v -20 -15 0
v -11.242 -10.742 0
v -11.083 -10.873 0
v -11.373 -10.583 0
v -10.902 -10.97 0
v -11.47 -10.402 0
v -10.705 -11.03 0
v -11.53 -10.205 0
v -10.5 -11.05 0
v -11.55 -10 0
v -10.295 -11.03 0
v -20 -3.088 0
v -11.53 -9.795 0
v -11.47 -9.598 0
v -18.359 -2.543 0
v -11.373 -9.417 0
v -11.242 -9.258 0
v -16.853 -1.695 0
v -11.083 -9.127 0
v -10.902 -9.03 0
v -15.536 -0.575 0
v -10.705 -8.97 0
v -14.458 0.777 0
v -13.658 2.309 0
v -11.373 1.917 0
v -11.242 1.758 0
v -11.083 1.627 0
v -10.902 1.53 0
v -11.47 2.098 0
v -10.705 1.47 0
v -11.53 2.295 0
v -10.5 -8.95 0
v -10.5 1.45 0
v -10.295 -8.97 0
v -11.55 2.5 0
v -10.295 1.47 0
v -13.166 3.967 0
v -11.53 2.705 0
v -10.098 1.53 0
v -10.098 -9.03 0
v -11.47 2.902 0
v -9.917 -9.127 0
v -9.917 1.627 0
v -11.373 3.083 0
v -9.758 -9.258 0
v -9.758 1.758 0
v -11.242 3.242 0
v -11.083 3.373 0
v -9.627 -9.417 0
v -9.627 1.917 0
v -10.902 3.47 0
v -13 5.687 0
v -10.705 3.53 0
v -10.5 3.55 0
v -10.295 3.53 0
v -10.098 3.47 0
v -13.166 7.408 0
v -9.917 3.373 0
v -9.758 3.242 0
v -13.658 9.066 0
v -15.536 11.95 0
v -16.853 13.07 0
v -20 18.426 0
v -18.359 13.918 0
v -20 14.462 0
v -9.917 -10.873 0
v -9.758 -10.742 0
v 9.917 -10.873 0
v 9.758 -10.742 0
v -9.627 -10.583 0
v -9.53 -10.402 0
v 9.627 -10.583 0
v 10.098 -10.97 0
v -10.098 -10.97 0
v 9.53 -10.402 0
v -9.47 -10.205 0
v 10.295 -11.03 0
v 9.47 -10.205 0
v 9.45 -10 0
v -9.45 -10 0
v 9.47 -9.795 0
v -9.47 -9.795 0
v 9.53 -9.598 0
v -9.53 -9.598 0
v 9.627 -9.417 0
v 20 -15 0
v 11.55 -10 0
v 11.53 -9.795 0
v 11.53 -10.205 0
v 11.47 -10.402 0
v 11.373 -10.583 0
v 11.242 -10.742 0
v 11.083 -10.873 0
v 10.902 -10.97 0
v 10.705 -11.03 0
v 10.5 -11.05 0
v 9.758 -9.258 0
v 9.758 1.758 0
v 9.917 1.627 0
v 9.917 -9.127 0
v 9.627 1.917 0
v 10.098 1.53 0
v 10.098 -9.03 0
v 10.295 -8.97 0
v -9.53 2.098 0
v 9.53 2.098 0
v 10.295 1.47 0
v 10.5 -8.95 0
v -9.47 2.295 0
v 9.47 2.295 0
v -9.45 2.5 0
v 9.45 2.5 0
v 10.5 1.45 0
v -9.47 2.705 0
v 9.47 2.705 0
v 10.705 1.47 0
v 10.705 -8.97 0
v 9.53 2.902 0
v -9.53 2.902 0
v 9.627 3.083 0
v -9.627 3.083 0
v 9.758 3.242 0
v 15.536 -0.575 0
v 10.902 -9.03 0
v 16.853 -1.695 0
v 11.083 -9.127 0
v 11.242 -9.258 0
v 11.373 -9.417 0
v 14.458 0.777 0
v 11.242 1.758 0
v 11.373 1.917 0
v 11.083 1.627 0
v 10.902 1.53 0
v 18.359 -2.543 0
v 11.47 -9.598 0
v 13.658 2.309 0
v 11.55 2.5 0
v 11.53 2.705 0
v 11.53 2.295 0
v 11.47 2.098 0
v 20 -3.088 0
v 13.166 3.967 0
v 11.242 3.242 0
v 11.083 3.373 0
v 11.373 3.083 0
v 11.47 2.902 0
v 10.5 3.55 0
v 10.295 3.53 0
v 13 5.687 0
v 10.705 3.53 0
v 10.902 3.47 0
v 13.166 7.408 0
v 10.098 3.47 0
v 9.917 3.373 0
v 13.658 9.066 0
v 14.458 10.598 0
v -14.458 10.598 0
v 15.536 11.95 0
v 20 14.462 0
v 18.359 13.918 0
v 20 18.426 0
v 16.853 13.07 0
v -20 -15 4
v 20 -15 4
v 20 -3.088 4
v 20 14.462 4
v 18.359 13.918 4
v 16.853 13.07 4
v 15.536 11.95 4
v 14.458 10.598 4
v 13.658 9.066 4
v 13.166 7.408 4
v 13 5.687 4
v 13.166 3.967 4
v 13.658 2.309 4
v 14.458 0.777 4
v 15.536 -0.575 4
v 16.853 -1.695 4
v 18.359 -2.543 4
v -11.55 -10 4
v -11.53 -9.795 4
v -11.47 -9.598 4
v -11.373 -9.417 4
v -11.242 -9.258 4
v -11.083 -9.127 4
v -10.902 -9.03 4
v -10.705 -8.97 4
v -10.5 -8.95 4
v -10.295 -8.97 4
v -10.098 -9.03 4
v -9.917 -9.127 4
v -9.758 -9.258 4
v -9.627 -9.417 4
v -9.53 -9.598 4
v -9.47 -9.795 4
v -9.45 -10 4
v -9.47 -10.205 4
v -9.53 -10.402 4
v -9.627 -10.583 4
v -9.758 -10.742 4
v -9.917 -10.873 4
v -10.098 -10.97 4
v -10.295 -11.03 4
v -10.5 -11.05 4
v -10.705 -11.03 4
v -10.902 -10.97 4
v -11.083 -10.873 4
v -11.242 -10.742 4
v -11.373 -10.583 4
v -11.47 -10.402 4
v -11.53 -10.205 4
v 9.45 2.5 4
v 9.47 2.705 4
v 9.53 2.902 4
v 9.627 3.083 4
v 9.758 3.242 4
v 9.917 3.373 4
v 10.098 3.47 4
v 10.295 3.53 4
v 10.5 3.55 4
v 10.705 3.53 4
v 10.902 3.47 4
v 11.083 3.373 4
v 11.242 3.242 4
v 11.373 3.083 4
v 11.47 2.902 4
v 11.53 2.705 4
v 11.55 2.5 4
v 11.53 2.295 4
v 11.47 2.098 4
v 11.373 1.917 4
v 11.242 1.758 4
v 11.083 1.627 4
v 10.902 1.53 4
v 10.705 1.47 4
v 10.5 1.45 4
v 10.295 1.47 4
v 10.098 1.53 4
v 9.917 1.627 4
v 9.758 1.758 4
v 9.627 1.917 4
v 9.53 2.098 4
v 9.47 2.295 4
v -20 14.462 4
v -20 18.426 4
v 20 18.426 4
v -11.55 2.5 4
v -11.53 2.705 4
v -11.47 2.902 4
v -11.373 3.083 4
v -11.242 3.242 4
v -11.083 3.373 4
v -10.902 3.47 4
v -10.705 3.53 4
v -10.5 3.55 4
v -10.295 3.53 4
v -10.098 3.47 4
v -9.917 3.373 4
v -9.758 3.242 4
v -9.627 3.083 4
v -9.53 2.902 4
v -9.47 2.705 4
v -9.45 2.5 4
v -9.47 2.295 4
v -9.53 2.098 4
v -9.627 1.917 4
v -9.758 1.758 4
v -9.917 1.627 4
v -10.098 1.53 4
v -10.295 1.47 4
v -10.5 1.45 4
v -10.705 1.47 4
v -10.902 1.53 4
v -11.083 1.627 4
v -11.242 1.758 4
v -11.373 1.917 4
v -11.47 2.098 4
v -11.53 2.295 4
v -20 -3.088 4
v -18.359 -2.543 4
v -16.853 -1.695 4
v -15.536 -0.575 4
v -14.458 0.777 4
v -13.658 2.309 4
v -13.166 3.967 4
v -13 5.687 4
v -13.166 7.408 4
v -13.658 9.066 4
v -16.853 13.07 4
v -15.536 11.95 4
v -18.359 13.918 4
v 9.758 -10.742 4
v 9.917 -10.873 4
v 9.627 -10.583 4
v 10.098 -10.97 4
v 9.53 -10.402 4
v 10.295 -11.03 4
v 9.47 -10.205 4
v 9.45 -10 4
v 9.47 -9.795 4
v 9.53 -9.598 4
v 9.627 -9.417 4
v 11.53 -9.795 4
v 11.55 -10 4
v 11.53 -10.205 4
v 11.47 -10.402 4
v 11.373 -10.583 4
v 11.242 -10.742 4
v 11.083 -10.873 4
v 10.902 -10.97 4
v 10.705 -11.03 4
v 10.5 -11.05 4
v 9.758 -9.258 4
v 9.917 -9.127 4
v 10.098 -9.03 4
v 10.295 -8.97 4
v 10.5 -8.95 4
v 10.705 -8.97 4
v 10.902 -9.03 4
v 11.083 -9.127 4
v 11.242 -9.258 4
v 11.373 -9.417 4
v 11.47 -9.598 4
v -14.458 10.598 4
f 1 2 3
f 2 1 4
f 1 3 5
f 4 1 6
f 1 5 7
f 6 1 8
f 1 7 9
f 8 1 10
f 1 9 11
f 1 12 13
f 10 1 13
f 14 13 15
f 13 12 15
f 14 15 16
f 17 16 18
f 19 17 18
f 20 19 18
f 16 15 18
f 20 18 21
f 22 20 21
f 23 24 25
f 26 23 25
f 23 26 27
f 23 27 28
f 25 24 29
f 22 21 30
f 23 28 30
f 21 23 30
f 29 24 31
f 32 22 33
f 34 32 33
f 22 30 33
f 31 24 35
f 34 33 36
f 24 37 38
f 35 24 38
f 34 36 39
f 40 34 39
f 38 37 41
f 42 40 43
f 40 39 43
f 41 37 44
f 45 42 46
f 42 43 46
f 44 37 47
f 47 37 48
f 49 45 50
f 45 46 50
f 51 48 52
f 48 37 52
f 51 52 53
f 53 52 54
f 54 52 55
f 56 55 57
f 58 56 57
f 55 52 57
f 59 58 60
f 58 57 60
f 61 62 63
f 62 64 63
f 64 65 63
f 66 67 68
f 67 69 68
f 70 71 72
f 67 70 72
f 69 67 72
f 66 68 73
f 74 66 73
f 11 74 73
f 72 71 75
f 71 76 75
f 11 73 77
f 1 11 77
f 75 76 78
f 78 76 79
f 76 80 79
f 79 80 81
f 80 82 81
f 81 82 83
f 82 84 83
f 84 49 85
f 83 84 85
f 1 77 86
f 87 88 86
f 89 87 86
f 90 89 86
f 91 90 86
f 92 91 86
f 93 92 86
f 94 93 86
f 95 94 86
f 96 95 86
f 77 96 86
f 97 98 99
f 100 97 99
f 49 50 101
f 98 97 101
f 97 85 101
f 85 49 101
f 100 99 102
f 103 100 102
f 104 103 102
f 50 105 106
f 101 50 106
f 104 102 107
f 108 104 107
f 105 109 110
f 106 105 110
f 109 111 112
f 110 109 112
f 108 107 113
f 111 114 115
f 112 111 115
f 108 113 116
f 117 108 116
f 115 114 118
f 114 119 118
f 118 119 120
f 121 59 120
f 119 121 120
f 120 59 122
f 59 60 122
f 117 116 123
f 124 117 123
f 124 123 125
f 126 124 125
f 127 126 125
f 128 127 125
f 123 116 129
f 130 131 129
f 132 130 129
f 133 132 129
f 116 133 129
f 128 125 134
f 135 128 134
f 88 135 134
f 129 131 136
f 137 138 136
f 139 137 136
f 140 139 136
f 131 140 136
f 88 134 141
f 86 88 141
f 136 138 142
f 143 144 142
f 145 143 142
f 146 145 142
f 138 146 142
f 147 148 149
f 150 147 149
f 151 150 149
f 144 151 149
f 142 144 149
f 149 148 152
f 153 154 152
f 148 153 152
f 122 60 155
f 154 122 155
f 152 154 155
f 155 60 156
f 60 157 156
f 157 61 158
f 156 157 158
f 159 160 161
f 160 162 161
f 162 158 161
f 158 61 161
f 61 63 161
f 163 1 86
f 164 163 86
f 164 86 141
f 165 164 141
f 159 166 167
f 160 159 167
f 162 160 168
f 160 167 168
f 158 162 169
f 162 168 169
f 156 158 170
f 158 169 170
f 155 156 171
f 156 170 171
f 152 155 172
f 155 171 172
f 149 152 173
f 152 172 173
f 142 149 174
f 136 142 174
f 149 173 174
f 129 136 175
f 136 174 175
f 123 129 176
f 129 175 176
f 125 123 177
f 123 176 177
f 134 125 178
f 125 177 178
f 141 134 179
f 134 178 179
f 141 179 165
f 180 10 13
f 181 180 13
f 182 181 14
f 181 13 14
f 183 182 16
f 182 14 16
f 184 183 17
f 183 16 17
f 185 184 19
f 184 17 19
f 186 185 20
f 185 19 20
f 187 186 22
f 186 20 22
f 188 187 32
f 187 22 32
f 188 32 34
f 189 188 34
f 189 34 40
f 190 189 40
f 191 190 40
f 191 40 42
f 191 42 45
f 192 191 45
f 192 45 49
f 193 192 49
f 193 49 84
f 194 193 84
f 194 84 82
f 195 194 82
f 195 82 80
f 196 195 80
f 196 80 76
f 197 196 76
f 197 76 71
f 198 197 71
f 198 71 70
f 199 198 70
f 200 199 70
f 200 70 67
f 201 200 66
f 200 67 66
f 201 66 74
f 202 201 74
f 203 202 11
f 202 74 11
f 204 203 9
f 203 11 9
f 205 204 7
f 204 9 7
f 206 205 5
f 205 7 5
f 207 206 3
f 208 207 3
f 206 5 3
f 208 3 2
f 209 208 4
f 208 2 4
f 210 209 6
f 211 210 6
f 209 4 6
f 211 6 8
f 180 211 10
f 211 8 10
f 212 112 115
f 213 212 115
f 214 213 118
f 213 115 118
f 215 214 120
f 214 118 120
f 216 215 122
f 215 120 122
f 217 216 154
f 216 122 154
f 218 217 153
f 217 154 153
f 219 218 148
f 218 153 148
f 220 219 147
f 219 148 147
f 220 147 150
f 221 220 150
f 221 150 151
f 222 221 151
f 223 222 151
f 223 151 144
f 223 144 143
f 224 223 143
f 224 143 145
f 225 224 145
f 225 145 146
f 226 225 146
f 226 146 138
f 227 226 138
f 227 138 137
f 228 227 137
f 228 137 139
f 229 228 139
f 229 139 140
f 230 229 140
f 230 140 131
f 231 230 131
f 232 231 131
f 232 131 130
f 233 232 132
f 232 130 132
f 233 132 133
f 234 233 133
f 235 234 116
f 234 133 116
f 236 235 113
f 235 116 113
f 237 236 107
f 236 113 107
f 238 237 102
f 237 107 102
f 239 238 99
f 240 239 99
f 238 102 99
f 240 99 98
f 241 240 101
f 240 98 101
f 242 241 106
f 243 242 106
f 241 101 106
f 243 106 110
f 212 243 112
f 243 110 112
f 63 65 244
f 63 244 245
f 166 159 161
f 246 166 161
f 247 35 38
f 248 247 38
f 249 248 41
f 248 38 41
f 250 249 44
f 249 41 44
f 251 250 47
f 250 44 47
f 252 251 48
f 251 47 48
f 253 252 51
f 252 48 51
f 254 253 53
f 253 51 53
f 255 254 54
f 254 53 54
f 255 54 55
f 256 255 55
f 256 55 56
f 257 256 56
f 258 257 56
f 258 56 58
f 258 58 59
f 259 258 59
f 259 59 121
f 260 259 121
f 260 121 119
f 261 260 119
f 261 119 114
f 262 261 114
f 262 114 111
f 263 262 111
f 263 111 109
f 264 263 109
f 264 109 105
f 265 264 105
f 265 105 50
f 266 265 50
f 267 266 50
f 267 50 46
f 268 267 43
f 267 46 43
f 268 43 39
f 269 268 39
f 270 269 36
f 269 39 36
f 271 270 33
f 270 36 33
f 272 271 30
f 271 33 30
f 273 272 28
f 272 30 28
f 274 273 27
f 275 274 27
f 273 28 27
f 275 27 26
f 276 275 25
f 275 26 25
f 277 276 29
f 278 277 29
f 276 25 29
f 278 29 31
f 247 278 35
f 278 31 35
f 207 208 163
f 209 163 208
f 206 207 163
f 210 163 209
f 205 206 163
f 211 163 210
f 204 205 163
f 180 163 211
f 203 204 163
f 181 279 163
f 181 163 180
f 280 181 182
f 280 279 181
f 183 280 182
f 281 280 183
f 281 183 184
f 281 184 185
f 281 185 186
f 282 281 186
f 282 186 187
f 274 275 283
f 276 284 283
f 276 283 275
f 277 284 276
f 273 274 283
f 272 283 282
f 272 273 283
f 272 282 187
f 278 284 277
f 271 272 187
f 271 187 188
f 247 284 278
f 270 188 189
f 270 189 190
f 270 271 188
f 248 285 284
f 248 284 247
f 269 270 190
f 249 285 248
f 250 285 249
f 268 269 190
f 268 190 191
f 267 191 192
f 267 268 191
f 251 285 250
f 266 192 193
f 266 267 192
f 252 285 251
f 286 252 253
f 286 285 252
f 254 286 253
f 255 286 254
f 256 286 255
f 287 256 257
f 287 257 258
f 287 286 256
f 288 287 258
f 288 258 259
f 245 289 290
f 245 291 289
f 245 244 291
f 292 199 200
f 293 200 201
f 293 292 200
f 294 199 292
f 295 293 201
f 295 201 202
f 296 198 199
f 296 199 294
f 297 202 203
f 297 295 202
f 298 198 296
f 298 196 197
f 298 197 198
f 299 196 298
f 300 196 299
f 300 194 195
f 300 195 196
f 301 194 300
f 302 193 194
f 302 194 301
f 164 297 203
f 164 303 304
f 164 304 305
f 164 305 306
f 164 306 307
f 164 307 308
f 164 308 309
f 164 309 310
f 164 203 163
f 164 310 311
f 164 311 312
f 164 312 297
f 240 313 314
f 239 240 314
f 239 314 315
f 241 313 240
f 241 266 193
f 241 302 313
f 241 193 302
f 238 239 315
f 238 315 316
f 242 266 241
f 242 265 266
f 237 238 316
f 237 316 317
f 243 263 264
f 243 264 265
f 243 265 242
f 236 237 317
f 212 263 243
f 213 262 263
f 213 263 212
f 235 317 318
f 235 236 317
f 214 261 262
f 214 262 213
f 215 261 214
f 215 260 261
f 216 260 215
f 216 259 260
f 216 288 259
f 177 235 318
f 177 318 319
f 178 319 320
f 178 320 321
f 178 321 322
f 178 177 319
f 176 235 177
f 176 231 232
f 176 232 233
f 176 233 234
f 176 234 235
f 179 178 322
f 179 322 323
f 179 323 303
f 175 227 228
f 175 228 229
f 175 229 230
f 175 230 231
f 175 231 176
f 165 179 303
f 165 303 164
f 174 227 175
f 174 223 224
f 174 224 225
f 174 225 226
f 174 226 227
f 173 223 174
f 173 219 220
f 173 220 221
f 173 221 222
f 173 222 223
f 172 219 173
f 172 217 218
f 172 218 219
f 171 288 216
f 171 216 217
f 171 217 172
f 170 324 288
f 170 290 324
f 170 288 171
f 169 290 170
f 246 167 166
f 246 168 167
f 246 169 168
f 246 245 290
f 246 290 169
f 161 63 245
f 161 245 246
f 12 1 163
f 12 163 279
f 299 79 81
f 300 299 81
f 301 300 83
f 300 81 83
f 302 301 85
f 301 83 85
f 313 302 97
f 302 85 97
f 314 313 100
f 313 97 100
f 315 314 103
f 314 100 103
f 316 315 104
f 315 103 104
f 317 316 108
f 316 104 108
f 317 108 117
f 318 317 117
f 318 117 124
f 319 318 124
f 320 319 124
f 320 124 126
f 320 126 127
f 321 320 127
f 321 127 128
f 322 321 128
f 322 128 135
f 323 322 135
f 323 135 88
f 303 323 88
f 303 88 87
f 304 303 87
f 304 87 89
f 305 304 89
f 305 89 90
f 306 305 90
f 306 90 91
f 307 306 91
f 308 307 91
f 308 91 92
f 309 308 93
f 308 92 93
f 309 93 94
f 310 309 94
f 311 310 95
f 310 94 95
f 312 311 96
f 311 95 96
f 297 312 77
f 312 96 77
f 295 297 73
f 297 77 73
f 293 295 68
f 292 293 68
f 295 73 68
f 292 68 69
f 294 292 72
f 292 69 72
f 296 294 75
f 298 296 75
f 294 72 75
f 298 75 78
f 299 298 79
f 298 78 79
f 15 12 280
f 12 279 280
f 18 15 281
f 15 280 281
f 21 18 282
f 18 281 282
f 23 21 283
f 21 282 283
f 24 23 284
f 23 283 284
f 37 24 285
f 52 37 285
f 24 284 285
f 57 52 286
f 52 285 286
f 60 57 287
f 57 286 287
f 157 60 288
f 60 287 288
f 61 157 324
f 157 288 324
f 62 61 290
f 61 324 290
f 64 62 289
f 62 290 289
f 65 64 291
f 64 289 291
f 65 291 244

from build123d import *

# Parameters (mm, degrees)
SKETCH1_W           = 40
SKETCH1_H           = 33.426210179
BOSS_EXTRUDE1_DEPTH = 4
SKETCH2_R           = 1.05
CUT_EXTRUDE1_DEPTH  = 28.486819051
SKETCH3_R           = 9
CUT_EXTRUDE2_DEPTH  = 5


with BuildPart() as part:
    # Sketch1 → Boss-Extrude1 (new body)
    with BuildSketch(Plane.XY):
        with Locations((0, 1.713105089)):
            Rectangle(SKETCH1_W, SKETCH1_H)
    extrude(amount=BOSS_EXTRUDE1_DEPTH)

    # Sketch2 → Cut-Extrude1 (cut, through all)
    with BuildSketch(Plane(origin=(0, 0, 0), x_dir=(-1, 0, 0), z_dir=(0, 0, -1))):
        with Locations((-10.5, 2.5)):
            Circle(SKETCH2_R)
        with Locations((10.5, 2.5)):
            Circle(SKETCH2_R)
        with Locations((-10.5, -10)):
            Circle(SKETCH2_R)
        with Locations((10.5, -10)):
            Circle(SKETCH2_R)
    extrude(amount=-CUT_EXTRUDE1_DEPTH, mode=Mode.SUBTRACT)

    # Sketch3 → Cut-Extrude2 (cut)
    with BuildSketch(Plane.XY.offset(4)):
        with Locations((22, 5.687428233)):
            Circle(SKETCH3_R)
        with Locations((-22, 5.687428233)):
            Circle(SKETCH3_R)
    extrude(amount=-CUT_EXTRUDE2_DEPTH, mode=Mode.SUBTRACT)


solid = part.part
